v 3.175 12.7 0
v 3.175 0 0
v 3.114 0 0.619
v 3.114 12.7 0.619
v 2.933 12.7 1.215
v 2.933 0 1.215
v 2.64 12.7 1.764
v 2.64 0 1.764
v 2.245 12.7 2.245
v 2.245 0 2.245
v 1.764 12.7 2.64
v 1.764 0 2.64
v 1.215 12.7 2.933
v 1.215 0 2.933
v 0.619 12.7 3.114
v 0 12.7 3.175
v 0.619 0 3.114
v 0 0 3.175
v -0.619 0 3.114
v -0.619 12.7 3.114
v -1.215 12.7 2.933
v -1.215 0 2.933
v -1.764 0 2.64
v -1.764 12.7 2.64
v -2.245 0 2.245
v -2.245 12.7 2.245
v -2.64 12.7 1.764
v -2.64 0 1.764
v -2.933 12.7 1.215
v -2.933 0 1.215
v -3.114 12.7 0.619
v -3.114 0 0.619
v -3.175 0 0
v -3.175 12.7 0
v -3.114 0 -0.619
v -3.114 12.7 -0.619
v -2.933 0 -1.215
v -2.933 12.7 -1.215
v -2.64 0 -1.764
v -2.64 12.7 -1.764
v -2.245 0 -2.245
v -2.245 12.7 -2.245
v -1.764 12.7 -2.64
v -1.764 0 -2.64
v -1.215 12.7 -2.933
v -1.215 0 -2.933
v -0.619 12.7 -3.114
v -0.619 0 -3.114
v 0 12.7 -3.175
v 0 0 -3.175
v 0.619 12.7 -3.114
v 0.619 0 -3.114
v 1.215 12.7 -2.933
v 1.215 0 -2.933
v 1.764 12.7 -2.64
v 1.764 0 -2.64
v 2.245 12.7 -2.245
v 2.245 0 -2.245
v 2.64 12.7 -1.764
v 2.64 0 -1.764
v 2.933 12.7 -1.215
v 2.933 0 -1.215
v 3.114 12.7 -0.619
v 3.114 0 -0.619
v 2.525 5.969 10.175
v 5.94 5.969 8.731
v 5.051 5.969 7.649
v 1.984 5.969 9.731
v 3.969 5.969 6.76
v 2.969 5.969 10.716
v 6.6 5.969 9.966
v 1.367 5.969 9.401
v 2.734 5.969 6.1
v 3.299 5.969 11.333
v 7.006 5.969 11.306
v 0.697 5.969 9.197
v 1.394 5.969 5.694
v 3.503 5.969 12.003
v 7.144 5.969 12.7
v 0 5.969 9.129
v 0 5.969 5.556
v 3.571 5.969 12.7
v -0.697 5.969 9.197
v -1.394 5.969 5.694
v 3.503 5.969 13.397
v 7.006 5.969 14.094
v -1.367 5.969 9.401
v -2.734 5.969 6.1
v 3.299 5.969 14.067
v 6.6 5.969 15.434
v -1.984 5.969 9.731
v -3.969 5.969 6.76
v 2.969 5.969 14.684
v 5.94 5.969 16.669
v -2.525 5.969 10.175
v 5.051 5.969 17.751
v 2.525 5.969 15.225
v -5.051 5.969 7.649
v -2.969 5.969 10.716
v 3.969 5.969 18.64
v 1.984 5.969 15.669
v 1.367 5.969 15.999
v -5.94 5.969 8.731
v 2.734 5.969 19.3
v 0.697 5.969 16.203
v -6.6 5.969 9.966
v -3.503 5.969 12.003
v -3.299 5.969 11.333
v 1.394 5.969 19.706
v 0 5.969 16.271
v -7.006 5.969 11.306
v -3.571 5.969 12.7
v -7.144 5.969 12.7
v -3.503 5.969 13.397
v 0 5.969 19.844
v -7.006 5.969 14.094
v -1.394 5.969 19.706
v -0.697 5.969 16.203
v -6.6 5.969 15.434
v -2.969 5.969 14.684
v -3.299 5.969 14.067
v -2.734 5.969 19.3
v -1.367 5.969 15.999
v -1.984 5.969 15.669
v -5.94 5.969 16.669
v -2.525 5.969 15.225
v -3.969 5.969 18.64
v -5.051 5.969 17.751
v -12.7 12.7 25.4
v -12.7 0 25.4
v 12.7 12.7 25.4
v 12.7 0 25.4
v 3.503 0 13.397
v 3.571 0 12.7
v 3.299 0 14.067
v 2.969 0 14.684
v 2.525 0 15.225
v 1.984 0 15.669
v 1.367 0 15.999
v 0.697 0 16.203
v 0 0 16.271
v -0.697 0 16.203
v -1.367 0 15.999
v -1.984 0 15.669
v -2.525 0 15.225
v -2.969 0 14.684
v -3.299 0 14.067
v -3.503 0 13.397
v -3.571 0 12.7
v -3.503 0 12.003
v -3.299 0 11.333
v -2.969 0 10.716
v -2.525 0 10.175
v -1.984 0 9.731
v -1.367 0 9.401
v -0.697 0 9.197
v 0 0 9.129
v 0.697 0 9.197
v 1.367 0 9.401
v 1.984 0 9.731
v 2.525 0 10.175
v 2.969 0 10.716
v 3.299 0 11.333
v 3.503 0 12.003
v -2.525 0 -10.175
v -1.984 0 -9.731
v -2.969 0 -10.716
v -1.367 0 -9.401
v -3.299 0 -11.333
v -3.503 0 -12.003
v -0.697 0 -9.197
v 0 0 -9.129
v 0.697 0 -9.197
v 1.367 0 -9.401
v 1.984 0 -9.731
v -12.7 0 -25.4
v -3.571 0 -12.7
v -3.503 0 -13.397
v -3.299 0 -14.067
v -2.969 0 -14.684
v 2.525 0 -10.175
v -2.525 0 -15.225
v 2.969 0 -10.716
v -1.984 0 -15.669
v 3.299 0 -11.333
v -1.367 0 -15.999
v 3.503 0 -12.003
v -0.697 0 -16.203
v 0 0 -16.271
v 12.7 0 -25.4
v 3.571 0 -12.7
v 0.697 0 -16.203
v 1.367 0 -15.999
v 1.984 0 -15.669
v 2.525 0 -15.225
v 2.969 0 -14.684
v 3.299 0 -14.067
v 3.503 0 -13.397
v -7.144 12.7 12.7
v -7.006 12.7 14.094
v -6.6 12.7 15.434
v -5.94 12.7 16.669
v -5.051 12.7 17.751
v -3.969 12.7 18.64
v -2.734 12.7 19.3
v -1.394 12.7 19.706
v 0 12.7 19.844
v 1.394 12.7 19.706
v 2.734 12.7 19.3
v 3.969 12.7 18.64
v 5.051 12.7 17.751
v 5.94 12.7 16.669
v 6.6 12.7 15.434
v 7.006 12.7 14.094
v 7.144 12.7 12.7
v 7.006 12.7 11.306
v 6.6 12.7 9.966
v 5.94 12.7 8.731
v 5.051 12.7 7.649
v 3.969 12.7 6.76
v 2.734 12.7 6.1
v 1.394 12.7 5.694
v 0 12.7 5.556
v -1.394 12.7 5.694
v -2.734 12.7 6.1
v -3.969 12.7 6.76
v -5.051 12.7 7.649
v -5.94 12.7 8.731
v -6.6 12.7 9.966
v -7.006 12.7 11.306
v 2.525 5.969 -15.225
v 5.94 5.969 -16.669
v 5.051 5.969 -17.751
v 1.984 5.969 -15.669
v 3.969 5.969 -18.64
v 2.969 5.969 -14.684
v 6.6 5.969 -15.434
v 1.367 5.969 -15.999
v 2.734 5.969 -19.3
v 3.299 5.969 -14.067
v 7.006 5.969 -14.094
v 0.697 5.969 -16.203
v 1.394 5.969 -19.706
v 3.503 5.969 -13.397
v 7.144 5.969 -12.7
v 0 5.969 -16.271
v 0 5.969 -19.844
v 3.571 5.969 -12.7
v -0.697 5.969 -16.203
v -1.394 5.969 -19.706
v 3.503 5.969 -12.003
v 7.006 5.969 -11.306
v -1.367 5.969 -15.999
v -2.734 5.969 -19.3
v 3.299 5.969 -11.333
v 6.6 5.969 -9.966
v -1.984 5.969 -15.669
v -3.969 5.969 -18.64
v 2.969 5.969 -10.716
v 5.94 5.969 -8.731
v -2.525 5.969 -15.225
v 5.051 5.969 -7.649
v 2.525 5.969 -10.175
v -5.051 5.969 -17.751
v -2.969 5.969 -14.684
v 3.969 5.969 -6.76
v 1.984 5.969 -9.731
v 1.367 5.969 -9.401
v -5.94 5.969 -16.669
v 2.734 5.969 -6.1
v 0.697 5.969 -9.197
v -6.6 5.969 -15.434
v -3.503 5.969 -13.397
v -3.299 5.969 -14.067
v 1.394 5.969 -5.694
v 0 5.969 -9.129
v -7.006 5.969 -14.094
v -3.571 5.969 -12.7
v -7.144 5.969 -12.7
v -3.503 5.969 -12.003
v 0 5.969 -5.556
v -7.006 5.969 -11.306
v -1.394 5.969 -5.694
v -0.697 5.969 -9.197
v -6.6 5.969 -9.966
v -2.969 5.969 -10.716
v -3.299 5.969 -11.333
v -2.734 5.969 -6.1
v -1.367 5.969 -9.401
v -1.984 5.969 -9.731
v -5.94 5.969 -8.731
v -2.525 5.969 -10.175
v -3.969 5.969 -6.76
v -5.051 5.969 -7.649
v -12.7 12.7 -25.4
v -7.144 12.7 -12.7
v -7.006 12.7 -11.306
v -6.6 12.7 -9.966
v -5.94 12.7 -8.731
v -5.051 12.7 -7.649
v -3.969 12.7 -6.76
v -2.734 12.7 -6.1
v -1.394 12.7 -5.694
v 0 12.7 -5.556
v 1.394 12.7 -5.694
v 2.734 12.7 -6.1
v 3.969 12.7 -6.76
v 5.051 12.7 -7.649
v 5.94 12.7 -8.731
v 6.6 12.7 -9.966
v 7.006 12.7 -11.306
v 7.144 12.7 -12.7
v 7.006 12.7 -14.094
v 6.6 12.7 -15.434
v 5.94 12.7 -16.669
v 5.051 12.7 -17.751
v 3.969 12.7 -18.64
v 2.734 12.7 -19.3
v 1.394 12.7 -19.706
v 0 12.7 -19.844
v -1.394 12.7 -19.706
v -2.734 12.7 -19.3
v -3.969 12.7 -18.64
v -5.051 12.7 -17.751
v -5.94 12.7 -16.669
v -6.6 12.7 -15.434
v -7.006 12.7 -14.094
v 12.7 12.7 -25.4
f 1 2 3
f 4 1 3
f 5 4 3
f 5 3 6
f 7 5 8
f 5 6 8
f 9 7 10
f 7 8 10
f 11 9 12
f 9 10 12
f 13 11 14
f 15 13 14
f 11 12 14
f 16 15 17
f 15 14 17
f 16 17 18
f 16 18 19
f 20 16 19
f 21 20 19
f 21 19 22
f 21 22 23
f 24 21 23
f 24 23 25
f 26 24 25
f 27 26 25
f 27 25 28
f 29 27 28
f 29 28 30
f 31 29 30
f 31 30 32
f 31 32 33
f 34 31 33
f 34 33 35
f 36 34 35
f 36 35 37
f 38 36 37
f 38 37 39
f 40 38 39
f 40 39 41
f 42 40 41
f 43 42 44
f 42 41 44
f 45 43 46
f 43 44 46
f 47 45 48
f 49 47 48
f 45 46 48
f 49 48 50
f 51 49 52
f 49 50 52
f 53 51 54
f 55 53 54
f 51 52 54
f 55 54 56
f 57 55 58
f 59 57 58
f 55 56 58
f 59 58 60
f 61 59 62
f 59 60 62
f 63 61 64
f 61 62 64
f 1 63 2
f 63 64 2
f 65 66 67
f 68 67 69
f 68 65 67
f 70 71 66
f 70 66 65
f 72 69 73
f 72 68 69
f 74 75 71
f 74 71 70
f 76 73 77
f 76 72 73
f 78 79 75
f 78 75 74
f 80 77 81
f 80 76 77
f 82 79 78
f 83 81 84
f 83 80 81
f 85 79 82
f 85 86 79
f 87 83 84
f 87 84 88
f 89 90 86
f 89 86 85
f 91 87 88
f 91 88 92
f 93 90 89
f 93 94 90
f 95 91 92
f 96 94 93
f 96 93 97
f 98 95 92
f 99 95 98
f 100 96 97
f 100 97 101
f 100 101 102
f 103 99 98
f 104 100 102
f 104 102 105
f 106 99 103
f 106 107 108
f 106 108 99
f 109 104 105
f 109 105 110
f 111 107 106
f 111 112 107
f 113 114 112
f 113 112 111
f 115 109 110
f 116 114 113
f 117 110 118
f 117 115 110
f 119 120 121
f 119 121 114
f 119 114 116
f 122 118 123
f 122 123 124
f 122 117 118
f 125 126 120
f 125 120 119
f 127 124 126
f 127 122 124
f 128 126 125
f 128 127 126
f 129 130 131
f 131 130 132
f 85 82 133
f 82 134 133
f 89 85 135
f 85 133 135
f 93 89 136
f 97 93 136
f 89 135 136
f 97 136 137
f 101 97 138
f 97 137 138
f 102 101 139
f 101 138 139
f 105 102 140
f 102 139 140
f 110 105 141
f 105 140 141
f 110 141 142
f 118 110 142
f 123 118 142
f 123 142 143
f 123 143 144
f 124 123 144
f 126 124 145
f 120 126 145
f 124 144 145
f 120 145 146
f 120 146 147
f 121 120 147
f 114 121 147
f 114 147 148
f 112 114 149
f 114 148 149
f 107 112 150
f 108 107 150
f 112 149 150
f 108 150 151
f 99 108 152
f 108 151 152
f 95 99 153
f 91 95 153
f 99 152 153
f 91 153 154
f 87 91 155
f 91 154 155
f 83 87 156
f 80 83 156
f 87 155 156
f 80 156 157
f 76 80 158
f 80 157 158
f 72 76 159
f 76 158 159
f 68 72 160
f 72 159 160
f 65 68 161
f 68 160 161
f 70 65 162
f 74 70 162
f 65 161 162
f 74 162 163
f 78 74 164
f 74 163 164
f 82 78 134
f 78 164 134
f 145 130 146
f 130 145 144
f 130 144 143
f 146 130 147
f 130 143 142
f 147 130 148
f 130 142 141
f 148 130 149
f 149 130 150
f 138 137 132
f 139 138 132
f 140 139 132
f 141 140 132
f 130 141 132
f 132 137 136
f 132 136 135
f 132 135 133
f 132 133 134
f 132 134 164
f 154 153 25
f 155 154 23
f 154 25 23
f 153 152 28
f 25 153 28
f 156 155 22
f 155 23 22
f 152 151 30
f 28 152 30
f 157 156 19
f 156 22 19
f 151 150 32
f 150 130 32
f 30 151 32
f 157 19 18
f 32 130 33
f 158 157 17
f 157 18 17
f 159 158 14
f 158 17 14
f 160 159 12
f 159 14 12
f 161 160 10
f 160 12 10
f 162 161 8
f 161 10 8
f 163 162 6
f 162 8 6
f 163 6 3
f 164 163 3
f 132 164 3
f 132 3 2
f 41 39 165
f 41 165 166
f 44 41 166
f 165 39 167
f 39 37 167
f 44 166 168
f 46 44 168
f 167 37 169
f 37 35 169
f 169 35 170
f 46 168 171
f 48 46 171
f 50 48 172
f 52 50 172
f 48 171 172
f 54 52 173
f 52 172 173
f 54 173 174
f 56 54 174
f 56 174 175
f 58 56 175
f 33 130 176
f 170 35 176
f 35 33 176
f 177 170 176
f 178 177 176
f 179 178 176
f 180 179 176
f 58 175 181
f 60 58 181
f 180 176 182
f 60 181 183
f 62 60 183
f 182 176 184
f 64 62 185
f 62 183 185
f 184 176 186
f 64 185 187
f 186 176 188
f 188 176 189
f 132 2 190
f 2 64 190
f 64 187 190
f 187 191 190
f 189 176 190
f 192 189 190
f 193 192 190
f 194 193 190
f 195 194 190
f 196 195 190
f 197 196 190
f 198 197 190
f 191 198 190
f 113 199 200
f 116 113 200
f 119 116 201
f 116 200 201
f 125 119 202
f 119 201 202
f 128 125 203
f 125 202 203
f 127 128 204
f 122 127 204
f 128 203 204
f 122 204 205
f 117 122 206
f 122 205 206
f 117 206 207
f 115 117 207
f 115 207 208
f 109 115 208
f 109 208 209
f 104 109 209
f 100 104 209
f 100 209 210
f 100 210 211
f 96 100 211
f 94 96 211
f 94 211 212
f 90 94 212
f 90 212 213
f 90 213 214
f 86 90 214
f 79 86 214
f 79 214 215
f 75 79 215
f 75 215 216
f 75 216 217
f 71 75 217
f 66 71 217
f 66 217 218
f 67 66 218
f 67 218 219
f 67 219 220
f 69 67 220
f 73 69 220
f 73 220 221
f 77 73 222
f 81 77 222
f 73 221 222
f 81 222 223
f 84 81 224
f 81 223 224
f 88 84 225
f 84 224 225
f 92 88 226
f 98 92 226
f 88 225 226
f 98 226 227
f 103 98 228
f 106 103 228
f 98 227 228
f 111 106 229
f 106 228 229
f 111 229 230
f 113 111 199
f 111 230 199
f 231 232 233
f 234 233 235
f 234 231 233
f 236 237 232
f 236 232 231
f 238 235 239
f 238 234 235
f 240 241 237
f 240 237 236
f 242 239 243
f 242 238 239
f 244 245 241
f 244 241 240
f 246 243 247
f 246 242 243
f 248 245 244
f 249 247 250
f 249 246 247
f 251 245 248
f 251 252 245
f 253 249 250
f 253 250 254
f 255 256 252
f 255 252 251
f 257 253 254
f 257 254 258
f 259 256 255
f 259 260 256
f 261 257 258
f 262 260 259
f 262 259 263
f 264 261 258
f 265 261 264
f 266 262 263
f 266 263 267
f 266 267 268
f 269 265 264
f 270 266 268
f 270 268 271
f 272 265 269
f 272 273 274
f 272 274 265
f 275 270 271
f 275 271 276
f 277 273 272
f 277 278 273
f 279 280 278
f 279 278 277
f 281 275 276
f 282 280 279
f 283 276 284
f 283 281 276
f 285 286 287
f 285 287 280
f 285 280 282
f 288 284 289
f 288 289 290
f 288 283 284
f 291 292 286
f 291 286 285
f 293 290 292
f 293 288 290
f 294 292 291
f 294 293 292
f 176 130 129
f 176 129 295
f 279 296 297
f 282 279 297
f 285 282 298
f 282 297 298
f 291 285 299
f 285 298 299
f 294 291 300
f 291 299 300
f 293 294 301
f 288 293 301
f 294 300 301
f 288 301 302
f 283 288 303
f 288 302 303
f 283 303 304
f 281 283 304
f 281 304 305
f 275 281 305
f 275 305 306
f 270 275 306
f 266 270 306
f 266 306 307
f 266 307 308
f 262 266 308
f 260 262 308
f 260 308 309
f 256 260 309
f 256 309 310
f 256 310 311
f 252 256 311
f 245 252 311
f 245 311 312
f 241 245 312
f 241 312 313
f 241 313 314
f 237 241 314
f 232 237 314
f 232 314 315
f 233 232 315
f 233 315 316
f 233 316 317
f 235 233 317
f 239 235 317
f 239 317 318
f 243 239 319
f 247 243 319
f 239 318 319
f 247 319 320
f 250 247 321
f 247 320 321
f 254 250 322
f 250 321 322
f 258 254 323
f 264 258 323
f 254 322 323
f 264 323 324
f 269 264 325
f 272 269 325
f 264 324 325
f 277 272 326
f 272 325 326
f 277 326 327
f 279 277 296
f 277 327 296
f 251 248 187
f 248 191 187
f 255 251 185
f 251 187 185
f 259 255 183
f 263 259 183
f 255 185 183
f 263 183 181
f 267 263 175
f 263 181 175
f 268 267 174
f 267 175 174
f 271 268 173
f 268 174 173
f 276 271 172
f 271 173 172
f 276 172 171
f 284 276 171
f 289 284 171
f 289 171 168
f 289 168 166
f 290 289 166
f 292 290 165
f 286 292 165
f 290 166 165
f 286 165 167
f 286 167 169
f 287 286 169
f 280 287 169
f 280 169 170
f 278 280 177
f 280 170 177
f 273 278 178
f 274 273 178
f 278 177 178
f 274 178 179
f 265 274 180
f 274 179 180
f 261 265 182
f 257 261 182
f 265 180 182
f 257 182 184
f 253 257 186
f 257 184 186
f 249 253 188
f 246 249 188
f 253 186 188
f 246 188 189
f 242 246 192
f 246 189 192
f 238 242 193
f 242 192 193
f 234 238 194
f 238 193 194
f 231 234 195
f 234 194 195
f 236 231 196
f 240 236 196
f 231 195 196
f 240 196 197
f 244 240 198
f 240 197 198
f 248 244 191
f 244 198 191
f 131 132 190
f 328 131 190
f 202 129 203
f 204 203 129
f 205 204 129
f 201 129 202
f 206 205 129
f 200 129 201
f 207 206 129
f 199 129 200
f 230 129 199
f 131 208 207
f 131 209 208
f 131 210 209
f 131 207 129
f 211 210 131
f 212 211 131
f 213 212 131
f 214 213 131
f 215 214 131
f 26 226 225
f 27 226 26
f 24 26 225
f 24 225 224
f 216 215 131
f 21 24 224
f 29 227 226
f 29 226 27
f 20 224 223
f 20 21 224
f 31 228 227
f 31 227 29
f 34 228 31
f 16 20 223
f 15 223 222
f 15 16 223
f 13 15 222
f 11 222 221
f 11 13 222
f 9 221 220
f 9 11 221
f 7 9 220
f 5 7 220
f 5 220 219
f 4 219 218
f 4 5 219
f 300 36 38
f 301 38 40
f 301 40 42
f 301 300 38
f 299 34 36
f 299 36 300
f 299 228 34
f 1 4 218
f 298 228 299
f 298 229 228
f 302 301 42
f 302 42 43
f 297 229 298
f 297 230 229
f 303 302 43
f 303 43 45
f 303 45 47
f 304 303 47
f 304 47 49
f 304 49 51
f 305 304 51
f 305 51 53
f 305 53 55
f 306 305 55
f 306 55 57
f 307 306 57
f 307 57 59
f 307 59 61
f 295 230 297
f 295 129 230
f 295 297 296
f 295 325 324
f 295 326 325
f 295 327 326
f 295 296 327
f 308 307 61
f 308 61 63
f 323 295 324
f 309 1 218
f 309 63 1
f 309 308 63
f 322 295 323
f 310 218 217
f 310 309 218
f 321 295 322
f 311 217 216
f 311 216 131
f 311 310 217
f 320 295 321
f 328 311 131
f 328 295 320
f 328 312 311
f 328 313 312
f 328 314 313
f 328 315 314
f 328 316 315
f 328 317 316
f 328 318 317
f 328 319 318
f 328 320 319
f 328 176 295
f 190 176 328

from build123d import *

# Parameters (mm, degrees)
SKETCH1_W                                            = 25.4
SKETCH1_H                                            = 50.8
EXTRUDE1_DEPTH                                       = 12.7
F_1_4_0_25_DIAMETER_HOLE1_D                          = 6.35
CBORE_FOR_1_4_BINDING_HEAD_MACHINE_SCREW_D           = 7.14248
CBORE_FOR_1_4_BINDING_HEAD_MACHINE_SCREW_CBORE_D     = 14.2875
CBORE_FOR_1_4_BINDING_HEAD_MACHINE_SCREW_CBORE_DEPTH = 6.731


with BuildPart() as part:
    # Sketch1 → Extrude1 (new body)
    with BuildSketch(Plane(origin=(0, 0, 0), x_dir=(1, 0, 0), z_dir=(0, 1, 0))):
        Rectangle(SKETCH1_W, SKETCH1_H)
    extrude(amount=EXTRUDE1_DEPTH)

    # 1/4 (0.25) Diameter Hole1 (through all)
    with Locations(Plane(origin=(0, 12.7, 0), x_dir=(-1, 0, 0), z_dir=(0, 1, 0))):
        with Locations((0, 0)):
            Hole(F_1_4_0_25_DIAMETER_HOLE1_D / 2)

    # CBORE for 1/4 Binding Head Machine Screw1 (through all)
    with Locations(Plane(origin=(0, 12.7, 0), x_dir=(-1, 0, 0), z_dir=(0, 1, 0))):
        with Locations((0, -12.7), (0, 12.7)):
            CounterBoreHole(CBORE_FOR_1_4_BINDING_HEAD_MACHINE_SCREW_D / 2, CBORE_FOR_1_4_BINDING_HEAD_MACHINE_SCREW_CBORE_D / 2, CBORE_FOR_1_4_BINDING_HEAD_MACHINE_SCREW_CBORE_DEPTH)


solid = part.part
